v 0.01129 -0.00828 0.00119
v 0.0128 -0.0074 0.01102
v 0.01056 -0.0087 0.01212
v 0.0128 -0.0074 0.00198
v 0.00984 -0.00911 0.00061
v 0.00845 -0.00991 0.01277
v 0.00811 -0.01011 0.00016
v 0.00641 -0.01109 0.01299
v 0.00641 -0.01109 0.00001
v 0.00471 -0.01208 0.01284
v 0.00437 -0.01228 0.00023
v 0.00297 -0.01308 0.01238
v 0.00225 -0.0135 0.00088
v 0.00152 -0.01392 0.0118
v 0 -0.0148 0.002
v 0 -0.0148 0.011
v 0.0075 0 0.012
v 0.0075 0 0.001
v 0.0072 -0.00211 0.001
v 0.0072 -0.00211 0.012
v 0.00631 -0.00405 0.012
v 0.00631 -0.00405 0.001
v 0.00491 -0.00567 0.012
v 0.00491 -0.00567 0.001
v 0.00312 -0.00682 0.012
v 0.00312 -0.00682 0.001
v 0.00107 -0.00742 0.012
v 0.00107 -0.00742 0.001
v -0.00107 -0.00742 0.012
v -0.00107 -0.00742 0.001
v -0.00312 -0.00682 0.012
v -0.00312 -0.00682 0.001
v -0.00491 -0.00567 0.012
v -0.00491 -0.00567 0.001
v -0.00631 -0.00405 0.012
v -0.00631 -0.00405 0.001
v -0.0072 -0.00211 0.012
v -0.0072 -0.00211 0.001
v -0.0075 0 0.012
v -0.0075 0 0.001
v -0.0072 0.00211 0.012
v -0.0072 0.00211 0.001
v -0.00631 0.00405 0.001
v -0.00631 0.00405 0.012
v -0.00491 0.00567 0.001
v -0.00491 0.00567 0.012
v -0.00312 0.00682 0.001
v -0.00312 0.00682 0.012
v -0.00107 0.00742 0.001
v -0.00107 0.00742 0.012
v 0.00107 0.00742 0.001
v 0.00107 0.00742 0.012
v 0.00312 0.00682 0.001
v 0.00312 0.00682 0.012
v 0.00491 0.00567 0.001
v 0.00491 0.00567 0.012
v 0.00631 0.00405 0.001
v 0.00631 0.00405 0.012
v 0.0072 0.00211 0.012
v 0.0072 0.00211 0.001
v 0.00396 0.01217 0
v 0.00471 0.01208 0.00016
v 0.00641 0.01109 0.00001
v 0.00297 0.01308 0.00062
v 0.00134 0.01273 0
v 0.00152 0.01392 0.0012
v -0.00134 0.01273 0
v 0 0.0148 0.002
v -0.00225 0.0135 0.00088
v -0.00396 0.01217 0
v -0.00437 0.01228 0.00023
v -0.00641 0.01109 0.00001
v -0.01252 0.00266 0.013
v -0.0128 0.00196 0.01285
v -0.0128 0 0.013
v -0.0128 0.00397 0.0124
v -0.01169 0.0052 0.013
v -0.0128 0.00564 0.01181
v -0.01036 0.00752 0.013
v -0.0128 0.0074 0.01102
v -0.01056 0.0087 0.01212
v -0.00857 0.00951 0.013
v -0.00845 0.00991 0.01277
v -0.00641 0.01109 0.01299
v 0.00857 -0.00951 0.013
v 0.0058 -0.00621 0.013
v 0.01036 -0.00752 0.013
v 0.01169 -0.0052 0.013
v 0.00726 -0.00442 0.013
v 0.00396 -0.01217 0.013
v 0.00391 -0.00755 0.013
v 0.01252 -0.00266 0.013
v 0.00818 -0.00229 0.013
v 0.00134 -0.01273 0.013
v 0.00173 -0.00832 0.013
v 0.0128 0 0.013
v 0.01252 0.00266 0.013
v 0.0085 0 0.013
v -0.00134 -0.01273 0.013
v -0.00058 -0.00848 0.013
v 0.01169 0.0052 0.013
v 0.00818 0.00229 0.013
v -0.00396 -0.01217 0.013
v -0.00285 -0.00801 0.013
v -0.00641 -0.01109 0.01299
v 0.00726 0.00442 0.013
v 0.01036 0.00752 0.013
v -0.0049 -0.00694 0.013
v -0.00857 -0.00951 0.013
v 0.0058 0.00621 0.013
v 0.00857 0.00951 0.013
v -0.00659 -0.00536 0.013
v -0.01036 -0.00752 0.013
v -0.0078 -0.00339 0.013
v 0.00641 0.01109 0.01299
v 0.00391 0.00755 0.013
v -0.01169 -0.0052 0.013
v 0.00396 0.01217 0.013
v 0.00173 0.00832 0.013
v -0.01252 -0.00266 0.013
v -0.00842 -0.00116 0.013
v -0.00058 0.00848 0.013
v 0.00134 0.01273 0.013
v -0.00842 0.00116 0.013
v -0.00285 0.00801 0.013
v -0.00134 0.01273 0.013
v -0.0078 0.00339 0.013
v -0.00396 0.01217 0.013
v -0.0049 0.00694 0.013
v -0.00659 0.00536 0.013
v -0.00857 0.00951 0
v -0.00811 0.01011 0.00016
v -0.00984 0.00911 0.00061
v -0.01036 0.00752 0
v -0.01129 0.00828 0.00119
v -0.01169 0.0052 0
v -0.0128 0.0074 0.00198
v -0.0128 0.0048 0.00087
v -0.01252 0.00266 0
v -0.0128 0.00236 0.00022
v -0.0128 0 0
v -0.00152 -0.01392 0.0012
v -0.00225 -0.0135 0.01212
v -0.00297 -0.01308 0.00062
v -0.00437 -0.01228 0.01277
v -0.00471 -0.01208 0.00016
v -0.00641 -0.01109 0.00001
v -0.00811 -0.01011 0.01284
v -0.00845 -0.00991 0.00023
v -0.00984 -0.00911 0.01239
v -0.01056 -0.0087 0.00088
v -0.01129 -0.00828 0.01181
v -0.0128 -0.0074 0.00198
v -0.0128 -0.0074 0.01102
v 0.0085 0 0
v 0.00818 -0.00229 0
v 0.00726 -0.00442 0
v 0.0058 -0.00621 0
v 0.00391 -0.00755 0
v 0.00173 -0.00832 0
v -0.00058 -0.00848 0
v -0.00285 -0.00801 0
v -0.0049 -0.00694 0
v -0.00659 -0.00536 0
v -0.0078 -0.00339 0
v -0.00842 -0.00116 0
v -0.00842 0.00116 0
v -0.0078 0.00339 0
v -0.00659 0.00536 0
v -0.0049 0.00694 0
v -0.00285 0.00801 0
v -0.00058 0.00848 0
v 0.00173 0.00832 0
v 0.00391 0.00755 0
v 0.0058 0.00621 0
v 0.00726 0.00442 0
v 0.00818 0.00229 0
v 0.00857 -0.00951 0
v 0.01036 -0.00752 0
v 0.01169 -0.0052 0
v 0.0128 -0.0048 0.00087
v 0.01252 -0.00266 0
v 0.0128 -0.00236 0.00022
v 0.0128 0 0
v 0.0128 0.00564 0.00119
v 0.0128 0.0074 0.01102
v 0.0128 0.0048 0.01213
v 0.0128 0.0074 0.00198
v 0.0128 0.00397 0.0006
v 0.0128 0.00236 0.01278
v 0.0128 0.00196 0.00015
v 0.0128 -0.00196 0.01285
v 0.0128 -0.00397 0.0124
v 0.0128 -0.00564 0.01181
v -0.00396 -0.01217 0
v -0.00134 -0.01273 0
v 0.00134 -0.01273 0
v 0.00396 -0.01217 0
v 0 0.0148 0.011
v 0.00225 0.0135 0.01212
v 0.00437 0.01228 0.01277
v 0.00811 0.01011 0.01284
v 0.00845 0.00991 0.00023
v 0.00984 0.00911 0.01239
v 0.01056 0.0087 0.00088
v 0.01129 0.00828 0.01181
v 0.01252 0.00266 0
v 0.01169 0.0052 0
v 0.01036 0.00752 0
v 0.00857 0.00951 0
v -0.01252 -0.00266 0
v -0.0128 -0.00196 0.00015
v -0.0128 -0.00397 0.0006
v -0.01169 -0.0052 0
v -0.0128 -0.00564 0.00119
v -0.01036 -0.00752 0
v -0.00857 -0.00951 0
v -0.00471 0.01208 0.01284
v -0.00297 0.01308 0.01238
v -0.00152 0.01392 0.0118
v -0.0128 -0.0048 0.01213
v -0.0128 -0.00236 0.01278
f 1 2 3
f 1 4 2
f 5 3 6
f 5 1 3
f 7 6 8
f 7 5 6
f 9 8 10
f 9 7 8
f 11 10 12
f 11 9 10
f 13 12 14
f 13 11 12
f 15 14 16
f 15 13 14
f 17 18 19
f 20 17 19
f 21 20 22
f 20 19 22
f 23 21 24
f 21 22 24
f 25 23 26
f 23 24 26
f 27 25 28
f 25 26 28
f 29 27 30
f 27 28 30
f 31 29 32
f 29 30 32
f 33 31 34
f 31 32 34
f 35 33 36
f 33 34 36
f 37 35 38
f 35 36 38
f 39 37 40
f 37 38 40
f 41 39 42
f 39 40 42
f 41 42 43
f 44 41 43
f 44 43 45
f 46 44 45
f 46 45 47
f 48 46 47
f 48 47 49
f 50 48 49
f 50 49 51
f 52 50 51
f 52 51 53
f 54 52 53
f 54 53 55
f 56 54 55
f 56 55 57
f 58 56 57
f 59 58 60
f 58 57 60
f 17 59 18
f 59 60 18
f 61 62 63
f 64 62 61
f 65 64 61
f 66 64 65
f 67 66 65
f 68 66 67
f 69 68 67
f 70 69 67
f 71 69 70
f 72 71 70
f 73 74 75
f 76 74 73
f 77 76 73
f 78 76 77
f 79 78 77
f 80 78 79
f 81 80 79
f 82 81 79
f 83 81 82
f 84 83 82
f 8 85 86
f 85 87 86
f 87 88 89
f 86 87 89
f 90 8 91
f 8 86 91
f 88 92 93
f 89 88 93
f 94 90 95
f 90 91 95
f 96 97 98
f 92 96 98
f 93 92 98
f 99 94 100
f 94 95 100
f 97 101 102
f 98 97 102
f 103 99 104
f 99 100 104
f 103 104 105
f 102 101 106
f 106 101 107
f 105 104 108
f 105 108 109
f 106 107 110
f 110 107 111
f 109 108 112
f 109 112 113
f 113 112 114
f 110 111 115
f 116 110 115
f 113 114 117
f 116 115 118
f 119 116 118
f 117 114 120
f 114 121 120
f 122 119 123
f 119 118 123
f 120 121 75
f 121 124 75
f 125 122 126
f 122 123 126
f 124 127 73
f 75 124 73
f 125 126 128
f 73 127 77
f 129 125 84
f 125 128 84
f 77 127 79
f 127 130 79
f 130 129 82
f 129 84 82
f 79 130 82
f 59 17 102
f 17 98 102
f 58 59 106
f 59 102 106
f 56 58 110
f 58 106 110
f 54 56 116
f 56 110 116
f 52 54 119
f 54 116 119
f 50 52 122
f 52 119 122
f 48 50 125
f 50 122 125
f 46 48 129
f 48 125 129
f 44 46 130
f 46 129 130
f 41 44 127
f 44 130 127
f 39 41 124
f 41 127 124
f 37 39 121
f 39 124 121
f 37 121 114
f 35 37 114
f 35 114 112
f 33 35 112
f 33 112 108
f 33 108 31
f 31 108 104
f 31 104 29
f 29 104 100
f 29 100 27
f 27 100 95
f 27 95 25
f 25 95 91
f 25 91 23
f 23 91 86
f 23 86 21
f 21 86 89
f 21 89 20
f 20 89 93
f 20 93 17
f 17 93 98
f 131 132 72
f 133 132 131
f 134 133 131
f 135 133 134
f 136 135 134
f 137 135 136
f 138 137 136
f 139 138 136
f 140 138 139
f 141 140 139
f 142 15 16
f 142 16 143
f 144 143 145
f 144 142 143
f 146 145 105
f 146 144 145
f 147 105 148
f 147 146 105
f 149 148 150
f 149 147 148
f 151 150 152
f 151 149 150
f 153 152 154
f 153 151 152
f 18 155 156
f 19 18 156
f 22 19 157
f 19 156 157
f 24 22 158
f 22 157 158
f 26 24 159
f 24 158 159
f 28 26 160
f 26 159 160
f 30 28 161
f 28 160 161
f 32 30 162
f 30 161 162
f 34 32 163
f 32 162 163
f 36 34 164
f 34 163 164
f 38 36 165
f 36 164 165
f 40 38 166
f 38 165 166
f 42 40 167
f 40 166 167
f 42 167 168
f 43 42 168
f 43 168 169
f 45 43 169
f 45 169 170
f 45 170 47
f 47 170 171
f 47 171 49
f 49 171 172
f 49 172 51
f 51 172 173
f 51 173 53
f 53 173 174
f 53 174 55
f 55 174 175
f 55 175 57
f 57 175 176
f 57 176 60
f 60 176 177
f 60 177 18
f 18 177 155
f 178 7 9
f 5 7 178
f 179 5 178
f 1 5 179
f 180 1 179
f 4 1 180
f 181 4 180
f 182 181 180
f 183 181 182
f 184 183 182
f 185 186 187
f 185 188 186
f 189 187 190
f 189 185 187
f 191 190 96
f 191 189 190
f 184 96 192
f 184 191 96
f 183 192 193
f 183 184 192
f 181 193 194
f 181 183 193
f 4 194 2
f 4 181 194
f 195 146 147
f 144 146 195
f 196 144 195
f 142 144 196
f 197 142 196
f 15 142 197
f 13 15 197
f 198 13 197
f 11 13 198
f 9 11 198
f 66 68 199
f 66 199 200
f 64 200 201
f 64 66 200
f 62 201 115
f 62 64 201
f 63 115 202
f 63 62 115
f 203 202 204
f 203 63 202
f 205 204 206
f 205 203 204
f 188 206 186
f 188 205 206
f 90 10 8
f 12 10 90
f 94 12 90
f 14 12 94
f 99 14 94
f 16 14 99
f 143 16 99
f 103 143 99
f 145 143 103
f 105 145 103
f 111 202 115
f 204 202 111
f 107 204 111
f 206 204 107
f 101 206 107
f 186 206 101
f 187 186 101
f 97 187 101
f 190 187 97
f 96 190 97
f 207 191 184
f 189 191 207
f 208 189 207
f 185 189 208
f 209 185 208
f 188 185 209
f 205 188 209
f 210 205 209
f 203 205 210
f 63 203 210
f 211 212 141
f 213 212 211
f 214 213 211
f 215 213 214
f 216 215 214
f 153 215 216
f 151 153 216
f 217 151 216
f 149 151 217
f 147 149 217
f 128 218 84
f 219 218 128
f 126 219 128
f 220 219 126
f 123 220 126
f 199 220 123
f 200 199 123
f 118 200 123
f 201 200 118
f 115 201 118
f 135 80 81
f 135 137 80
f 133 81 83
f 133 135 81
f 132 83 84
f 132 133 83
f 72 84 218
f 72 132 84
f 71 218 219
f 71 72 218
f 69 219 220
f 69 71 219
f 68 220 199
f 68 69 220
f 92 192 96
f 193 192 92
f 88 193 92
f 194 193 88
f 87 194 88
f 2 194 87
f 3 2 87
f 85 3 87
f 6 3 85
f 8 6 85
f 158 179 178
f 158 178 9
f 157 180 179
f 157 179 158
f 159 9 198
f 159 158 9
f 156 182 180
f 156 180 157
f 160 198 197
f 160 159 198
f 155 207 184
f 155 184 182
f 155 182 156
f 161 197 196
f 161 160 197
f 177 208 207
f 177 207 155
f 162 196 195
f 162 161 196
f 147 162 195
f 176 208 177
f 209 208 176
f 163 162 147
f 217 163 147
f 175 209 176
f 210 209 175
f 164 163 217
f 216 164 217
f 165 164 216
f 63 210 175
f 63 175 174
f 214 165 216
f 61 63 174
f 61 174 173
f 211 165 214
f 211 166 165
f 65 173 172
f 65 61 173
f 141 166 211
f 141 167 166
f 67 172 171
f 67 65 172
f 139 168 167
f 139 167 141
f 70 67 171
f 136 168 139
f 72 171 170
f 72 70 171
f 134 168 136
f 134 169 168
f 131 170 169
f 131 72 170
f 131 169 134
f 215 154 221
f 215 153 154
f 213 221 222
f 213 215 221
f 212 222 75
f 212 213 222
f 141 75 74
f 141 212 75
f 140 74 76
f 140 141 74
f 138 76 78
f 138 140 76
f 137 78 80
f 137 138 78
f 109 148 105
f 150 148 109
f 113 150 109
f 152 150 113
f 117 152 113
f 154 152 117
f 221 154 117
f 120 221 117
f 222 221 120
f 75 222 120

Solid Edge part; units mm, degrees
sketch "Sketch1" plane through (0, 0, 0) normal (0, 0, 1) x (1, 0, 0)
  circle A0 centre (0, 0) radius 0.0075
  line L0 (0, 0.0148) -> (0.0128, 0.0074)
  line L1 (0.0128, 0.0074) -> (0.0128, -0.0074)
  line L2 (0.0128, -0.0074) -> (0, -0.0148)
  line L3 (0, -0.0148) -> (-0.0128, -0.0074)
  line L4 (-0.0128, -0.0074) -> (-0.0128, 0.0074)
  line L5 (-0.0128, 0.0074) -> (0, 0.0148)
  dimension "D1" = 0.0296
  dimension "D2" = 0.015
extrude "Protrusion1" add sketch "Sketch1" along normal blind 0.013
sketch "Sketch2" plane through (0, 0, 0) normal (0, -1, 0) x (1, 0, 0)
  line L0 (0.0162, 0.0096) -> (0.0077, 0.0181)
  line L1 (0.0172, 0.0181) -> (0.0077, 0.0181)
  line L2 (0.0172, -0.0051) -> (0.0172, 0.0181)
  line L3 (0.0077, -0.0051) -> (0.0172, -0.0051)
  line L4 (0.0162, 0.0034) -> (0.0077, -0.0051)
  line L5 (0.0162, 0.0096) -> (0.0162, 0.0034)
revolve "RevolvedCutout1" cut sketch "Sketch2" angle 360 about axis through (0, 0, 54) along (0, 0, -1)
chamfer "Fase_1" distance 0.001 angle 45 2 edges at (-0.0075, 0, 0.013) (-0.0075, 0, 0)
